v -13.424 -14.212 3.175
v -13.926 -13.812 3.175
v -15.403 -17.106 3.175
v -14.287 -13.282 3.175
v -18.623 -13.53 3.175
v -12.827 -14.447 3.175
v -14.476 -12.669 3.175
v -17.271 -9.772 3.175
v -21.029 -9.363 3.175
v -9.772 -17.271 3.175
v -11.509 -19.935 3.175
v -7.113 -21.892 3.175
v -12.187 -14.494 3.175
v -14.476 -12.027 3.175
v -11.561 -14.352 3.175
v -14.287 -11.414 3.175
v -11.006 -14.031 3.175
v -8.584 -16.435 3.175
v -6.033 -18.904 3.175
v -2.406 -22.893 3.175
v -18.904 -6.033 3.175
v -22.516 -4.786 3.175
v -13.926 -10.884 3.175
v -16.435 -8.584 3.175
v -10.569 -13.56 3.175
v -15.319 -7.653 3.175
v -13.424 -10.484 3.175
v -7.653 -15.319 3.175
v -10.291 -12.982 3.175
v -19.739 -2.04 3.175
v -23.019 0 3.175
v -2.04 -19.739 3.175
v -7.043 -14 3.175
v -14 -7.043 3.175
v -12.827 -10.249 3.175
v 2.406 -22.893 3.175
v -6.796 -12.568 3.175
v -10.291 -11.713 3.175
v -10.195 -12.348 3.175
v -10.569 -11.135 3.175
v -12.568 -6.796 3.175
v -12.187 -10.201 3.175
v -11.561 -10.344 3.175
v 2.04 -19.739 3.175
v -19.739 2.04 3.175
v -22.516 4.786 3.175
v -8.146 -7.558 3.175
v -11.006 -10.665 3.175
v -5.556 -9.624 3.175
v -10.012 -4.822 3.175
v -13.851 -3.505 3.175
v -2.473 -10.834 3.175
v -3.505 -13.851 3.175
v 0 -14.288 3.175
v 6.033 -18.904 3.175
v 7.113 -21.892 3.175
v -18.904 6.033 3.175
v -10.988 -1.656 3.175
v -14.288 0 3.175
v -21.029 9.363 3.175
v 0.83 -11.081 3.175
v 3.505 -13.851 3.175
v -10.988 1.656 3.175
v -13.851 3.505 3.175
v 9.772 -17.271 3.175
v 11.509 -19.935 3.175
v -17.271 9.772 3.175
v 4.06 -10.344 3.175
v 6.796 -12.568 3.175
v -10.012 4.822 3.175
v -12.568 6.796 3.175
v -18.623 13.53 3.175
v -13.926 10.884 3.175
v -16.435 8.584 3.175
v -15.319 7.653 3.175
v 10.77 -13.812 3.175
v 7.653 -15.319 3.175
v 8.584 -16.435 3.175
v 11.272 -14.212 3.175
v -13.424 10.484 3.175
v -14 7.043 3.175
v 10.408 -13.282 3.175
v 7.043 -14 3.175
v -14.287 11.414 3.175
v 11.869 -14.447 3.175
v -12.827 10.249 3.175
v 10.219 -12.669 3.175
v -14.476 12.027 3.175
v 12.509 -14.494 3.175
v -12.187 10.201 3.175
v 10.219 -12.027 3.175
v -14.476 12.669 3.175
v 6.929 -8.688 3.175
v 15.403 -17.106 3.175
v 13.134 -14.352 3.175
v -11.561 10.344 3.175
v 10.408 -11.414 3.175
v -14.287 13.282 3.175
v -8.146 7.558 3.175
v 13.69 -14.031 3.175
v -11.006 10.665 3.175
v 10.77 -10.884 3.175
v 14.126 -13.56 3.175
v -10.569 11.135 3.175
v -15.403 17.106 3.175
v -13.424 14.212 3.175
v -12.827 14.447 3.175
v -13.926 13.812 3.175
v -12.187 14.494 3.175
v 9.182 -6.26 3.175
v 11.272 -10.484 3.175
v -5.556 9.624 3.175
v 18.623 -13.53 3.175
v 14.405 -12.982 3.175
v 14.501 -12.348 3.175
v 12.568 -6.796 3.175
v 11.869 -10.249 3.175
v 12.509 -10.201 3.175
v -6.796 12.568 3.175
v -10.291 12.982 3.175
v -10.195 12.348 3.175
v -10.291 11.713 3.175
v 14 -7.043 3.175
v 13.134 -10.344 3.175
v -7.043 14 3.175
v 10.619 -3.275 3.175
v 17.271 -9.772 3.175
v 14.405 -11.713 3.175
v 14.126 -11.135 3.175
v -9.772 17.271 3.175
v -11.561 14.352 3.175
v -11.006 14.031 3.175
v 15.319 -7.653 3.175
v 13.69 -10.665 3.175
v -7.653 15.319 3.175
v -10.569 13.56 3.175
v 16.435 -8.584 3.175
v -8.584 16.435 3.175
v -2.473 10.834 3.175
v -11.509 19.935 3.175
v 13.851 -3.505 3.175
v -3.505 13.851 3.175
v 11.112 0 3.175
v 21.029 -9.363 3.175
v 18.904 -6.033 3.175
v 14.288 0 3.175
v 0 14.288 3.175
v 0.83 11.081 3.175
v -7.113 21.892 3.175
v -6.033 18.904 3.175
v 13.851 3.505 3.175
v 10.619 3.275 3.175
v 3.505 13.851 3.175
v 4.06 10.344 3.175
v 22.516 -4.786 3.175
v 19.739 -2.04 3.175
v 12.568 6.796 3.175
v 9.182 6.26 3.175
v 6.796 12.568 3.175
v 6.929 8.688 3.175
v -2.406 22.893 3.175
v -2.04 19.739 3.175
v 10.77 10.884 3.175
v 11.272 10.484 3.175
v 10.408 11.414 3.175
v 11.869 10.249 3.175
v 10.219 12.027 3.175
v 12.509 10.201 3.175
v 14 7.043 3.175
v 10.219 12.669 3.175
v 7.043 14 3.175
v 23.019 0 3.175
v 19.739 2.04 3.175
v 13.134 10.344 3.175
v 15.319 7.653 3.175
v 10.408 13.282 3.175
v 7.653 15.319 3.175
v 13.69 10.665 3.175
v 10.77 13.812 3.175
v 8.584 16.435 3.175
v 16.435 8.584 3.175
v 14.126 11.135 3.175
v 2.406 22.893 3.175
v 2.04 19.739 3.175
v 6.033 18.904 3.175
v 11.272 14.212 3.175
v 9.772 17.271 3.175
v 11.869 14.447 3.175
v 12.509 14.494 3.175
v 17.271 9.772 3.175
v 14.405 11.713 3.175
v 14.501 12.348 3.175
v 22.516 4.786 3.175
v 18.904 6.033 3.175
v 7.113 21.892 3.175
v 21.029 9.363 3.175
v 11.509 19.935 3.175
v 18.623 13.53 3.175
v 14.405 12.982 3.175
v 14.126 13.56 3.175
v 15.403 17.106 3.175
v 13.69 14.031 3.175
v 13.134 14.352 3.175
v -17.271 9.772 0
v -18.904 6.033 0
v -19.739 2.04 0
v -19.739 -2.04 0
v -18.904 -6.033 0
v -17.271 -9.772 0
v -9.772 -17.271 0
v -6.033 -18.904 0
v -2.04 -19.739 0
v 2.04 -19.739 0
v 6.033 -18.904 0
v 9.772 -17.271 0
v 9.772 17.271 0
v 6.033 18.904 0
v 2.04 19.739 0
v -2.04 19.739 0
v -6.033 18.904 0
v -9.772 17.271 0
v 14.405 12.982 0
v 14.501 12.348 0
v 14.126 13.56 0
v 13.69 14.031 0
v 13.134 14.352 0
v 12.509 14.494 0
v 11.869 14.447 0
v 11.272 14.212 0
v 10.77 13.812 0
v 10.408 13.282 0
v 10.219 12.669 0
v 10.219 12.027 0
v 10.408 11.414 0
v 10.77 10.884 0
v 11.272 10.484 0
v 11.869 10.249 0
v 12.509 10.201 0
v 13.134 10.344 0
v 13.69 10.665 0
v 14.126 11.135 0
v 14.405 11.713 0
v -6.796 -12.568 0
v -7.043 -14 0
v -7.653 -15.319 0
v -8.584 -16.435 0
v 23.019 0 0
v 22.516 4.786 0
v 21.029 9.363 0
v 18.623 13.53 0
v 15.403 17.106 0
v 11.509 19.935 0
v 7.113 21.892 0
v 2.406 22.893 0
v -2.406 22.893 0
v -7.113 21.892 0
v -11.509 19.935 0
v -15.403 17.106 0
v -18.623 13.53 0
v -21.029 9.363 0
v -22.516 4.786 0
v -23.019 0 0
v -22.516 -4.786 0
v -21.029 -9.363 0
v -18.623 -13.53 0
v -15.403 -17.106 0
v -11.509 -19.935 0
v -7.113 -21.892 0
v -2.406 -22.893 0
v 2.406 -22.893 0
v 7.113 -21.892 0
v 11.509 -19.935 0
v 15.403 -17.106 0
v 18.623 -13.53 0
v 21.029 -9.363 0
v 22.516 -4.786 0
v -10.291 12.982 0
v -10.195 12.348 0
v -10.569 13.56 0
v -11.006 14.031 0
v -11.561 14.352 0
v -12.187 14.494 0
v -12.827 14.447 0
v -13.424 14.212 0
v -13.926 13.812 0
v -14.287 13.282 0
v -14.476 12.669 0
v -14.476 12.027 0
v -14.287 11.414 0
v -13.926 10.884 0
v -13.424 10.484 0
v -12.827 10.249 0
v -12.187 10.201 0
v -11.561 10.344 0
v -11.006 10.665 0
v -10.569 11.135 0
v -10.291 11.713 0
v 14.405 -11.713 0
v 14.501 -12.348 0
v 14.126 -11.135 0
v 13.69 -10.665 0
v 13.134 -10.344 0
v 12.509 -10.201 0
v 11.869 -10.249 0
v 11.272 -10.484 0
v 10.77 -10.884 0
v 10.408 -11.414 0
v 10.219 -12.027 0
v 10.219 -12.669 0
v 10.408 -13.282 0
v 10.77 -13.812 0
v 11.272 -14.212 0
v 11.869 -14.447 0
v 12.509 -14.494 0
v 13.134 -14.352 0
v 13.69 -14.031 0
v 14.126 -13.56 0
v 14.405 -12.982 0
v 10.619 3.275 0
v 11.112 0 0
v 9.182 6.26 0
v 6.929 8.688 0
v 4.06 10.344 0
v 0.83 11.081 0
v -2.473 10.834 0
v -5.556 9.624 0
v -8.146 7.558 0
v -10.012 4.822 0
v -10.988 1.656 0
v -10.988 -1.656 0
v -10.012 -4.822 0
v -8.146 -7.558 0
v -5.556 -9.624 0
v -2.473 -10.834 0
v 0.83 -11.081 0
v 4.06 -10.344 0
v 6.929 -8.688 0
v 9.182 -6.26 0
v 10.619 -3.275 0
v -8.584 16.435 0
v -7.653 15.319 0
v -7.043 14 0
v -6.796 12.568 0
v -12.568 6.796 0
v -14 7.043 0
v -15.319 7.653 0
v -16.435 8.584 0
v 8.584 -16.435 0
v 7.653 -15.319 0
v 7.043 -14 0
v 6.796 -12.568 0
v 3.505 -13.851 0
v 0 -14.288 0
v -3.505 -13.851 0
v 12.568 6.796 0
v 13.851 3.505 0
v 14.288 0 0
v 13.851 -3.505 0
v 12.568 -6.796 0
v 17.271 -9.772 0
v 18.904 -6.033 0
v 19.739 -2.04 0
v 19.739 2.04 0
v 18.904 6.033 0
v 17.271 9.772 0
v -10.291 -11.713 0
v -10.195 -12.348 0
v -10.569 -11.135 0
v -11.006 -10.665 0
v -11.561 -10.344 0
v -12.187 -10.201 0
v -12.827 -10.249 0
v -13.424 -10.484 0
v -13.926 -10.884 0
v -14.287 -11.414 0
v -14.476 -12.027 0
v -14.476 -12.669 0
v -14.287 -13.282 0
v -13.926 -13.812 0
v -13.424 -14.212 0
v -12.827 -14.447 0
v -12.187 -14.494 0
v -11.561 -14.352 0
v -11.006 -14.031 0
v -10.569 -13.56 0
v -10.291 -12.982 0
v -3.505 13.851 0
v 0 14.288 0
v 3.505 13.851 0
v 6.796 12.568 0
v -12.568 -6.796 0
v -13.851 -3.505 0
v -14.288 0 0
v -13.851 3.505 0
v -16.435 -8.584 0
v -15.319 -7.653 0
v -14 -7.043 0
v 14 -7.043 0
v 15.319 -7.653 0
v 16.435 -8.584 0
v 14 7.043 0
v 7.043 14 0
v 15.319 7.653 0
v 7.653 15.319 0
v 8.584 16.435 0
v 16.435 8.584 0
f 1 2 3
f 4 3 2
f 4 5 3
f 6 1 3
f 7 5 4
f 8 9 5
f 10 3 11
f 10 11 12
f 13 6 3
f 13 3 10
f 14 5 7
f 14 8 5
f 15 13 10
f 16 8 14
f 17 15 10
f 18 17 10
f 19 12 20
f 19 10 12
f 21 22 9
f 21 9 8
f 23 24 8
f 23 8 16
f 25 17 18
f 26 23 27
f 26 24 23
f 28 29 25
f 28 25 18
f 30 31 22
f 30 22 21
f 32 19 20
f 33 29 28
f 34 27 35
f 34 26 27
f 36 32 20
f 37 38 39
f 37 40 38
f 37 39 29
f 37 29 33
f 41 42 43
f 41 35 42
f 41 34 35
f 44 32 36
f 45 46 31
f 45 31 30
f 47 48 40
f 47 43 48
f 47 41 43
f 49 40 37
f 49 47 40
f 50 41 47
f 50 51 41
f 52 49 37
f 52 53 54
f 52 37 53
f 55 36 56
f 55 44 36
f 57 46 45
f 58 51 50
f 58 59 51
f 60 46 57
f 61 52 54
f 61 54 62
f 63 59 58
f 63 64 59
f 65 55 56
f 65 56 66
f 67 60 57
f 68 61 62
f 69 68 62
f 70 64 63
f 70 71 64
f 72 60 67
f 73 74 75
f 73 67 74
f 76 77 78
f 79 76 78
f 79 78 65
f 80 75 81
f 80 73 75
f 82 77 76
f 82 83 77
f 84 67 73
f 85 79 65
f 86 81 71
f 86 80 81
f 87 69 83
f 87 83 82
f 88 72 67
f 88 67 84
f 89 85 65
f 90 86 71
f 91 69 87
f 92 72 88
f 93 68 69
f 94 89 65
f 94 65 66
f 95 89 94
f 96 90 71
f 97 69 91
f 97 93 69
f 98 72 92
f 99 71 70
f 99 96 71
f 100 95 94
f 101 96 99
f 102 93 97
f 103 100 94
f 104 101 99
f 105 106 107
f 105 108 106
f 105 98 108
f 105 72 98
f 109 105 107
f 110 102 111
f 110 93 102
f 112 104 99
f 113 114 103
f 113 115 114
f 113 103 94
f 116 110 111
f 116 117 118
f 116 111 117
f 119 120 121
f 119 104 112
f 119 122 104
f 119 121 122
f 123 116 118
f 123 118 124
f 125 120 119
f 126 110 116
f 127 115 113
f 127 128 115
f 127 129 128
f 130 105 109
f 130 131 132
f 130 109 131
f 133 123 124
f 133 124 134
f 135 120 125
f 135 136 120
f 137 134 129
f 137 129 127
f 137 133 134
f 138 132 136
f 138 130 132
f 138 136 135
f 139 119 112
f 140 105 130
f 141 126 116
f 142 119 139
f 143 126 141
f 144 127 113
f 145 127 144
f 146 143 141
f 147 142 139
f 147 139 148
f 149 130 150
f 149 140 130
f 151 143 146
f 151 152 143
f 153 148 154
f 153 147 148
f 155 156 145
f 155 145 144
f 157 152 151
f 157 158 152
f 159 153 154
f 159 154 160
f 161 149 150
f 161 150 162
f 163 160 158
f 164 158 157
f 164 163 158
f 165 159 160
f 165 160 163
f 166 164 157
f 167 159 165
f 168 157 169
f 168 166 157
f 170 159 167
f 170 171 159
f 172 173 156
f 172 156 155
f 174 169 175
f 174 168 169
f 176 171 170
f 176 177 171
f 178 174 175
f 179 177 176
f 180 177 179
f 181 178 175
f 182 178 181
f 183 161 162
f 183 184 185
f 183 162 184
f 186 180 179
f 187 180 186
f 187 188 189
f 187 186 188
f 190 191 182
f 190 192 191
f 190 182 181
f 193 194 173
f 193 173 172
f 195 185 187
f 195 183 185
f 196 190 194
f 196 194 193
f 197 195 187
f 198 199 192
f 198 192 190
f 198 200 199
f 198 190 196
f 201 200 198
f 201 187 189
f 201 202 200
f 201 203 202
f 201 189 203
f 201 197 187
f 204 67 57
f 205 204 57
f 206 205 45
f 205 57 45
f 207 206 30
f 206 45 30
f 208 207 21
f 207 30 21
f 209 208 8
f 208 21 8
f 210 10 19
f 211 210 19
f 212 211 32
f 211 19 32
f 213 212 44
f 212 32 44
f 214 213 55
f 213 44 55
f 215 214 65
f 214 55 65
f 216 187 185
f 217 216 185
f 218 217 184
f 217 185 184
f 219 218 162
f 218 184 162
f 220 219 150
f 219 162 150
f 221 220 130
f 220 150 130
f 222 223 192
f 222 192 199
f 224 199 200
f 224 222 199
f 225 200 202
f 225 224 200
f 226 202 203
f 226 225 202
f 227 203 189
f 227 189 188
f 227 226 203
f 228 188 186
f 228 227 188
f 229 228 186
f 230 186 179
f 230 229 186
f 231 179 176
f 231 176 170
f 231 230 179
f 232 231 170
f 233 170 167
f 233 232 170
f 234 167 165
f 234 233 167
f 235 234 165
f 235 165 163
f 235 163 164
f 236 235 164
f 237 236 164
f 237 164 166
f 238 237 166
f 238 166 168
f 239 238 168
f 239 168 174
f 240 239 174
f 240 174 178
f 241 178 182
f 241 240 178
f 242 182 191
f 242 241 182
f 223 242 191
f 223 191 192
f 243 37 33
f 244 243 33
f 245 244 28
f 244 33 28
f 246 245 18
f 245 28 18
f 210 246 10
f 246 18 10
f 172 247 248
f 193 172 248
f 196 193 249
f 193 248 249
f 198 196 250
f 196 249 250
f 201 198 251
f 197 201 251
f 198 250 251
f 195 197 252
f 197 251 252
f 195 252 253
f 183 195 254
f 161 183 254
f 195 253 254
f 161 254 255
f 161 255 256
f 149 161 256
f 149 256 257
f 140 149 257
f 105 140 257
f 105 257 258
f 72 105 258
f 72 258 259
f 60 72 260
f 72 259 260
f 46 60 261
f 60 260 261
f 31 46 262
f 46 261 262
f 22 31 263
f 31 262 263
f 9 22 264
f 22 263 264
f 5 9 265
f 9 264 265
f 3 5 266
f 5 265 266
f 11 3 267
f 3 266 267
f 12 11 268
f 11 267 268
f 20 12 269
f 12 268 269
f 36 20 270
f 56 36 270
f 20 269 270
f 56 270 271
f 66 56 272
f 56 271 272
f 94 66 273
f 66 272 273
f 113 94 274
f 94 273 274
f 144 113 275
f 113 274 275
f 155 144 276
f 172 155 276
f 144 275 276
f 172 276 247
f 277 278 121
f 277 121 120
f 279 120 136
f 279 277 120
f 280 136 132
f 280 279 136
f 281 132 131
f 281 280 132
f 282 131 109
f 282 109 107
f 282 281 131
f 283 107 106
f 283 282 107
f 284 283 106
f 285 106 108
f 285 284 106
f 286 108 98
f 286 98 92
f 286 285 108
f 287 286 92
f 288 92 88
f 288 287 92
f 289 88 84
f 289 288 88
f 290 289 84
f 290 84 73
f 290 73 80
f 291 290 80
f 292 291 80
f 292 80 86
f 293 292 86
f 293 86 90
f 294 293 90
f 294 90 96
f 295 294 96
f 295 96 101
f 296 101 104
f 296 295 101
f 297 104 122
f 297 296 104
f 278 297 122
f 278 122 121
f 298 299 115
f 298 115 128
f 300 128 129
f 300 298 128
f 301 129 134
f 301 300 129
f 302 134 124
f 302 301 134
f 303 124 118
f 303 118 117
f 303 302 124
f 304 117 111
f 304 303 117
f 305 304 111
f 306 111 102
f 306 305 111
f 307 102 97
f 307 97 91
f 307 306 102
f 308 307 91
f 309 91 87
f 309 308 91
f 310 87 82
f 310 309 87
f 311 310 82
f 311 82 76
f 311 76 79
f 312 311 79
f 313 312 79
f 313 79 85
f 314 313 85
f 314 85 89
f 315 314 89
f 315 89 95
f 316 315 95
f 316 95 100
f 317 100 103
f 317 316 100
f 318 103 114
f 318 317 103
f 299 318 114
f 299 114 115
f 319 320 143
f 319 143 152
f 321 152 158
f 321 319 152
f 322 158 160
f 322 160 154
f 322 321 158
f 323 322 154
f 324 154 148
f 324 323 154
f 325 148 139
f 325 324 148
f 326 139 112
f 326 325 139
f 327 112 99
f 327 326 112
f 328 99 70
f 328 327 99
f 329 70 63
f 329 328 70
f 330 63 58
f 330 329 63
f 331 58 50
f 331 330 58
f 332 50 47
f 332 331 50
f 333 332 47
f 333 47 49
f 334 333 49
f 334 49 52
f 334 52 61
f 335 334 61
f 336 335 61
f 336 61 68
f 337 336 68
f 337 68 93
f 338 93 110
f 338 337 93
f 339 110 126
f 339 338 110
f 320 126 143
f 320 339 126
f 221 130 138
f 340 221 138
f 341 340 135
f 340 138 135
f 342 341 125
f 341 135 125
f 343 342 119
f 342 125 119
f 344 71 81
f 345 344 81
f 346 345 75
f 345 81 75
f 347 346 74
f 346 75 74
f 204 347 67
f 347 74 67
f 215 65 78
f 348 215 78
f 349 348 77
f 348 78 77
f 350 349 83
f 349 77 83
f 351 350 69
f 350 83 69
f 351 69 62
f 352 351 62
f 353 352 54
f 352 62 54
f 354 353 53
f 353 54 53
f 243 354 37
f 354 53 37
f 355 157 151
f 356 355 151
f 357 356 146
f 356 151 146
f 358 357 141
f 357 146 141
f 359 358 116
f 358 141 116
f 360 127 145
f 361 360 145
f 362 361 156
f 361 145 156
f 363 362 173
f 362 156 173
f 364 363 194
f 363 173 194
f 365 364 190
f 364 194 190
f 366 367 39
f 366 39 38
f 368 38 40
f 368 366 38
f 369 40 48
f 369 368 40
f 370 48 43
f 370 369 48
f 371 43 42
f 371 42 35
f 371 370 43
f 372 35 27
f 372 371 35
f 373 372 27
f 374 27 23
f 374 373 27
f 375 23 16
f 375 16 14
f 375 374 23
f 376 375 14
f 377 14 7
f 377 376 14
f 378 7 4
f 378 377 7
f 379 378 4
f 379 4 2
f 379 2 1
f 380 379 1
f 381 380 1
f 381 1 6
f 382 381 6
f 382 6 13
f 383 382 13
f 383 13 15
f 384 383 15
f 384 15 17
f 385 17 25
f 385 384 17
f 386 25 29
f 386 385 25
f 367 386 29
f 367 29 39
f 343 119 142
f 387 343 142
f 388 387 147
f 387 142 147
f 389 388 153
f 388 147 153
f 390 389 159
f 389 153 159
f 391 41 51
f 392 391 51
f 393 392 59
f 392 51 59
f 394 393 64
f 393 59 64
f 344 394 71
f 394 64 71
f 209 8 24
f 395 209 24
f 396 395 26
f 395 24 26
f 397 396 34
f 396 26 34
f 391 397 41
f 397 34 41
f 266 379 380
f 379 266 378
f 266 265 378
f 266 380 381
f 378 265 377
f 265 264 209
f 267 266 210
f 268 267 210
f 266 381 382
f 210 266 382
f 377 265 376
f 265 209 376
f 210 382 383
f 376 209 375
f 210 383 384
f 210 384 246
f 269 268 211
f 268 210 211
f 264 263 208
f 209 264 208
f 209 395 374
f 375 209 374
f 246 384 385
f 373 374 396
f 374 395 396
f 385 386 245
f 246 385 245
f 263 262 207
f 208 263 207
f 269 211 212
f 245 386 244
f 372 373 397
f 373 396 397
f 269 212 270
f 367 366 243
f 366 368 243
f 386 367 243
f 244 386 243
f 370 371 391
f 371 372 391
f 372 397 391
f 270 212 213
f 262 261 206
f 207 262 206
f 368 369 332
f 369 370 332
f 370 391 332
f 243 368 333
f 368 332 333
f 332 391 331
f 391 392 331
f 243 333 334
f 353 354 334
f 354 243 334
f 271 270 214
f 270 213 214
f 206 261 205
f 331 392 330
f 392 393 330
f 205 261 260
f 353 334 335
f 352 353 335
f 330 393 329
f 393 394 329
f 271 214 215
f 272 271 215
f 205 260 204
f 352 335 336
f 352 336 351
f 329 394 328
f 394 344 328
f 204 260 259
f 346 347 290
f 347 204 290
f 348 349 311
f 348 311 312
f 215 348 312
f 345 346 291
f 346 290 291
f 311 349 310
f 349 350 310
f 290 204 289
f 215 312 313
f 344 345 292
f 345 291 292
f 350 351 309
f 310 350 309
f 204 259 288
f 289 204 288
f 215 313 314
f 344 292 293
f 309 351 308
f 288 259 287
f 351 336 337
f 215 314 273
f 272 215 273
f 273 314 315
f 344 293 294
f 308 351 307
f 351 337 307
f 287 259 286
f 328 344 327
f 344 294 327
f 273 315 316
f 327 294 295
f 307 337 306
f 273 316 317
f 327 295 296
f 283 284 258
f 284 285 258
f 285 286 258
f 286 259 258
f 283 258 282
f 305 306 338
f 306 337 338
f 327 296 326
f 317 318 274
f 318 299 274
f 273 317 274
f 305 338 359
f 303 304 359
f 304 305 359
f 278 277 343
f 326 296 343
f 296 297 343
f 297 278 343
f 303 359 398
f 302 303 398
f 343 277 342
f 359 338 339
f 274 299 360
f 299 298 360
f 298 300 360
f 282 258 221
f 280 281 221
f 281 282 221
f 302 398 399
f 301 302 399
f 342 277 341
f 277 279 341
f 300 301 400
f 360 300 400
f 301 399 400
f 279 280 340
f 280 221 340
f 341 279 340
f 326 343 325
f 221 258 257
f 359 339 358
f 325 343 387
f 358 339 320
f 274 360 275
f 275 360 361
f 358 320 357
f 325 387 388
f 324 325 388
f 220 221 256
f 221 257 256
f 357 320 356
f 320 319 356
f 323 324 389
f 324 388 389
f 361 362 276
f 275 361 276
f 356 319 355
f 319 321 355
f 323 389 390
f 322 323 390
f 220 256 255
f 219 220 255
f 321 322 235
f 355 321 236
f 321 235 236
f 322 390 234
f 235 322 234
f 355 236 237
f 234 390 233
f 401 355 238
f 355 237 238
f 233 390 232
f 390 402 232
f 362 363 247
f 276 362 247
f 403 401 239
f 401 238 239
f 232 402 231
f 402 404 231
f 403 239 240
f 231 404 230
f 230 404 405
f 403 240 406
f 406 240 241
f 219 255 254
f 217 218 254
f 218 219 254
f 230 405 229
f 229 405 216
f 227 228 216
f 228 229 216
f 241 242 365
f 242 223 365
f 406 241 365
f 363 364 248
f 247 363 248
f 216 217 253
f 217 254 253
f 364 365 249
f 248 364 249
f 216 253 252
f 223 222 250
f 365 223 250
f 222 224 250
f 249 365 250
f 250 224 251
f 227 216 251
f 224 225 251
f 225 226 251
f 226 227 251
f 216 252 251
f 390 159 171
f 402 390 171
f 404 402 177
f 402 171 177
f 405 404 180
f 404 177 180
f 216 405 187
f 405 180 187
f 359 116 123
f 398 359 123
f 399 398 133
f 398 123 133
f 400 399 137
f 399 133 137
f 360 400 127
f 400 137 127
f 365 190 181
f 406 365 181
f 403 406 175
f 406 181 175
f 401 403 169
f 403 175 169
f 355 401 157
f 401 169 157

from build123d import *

# Parameters (mm, degrees)
F0_R            = 23.01875
F0_R_2          = 2.15265
F0_R_3          = 11.1125
F1_DEPTH        = 3.175
F3_DEPTH        = 3.175
F3_COPIES_COUNT = 4


# Not quite as in the source:
# - a pattern or mirror of a feature is missing from the dataset's text; its kind, count and spacing are read off the source's solid


with BuildPart() as f1:
    # F0 (on Top) → F1 (new body)
    with BuildSketch(Plane.XY):
        Circle(F0_R)
        with Locations((-12.3478521665, -12.3478521665)):
            Circle(F0_R_2, mode=Mode.SUBTRACT)
        with Locations((12.3478521665, -12.3478521665)):
            Circle(F0_R_2, mode=Mode.SUBTRACT)
        with Locations((-12.3478521665, 12.3478521665)):
            Circle(F0_R_2, mode=Mode.SUBTRACT)
        Circle(F0_R_3, mode=Mode.SUBTRACT)
        with Locations((12.3478521665, 12.3478521665)):
            Circle(F0_R_2, mode=Mode.SUBTRACT)
    extrude(amount=F1_DEPTH)

    # F2 (on face) → F3 (cut, through all)
    with BuildSketch(Plane.XY.offset(3.175)):
        with BuildLine():
            ThreePointArc((-9.7719120136, 17.2709047146), (-7.6525973796, 15.318794197), (-6.7959542154, 12.5677230456))
            ThreePointArc((-6.7959542154, 12.5677230456), (0, 14.2875), (6.7959542154, 12.5677230456))
            ThreePointArc((6.7959542154, 12.5677230456), (7.6525973796, 15.318794197), (9.7719120136, 17.2709047146))
            ThreePointArc((9.7719120136, 17.2709047146), (0, 19.84375), (-9.7719120136, 17.2709047146))
        make_face()
    f3 = extrude(amount=-F3_DEPTH, mode=Mode.SUBTRACT)

    # F3_copies: F3 ×4 about axis
    f3_copies_axis = Axis((0, 0, 0), (0, 0, 1))
    for i in range(1, F3_COPIES_COUNT):
        add(f3.rotate(f3_copies_axis, i * 360 / F3_COPIES_COUNT), mode=Mode.SUBTRACT)


solid = f1.part
